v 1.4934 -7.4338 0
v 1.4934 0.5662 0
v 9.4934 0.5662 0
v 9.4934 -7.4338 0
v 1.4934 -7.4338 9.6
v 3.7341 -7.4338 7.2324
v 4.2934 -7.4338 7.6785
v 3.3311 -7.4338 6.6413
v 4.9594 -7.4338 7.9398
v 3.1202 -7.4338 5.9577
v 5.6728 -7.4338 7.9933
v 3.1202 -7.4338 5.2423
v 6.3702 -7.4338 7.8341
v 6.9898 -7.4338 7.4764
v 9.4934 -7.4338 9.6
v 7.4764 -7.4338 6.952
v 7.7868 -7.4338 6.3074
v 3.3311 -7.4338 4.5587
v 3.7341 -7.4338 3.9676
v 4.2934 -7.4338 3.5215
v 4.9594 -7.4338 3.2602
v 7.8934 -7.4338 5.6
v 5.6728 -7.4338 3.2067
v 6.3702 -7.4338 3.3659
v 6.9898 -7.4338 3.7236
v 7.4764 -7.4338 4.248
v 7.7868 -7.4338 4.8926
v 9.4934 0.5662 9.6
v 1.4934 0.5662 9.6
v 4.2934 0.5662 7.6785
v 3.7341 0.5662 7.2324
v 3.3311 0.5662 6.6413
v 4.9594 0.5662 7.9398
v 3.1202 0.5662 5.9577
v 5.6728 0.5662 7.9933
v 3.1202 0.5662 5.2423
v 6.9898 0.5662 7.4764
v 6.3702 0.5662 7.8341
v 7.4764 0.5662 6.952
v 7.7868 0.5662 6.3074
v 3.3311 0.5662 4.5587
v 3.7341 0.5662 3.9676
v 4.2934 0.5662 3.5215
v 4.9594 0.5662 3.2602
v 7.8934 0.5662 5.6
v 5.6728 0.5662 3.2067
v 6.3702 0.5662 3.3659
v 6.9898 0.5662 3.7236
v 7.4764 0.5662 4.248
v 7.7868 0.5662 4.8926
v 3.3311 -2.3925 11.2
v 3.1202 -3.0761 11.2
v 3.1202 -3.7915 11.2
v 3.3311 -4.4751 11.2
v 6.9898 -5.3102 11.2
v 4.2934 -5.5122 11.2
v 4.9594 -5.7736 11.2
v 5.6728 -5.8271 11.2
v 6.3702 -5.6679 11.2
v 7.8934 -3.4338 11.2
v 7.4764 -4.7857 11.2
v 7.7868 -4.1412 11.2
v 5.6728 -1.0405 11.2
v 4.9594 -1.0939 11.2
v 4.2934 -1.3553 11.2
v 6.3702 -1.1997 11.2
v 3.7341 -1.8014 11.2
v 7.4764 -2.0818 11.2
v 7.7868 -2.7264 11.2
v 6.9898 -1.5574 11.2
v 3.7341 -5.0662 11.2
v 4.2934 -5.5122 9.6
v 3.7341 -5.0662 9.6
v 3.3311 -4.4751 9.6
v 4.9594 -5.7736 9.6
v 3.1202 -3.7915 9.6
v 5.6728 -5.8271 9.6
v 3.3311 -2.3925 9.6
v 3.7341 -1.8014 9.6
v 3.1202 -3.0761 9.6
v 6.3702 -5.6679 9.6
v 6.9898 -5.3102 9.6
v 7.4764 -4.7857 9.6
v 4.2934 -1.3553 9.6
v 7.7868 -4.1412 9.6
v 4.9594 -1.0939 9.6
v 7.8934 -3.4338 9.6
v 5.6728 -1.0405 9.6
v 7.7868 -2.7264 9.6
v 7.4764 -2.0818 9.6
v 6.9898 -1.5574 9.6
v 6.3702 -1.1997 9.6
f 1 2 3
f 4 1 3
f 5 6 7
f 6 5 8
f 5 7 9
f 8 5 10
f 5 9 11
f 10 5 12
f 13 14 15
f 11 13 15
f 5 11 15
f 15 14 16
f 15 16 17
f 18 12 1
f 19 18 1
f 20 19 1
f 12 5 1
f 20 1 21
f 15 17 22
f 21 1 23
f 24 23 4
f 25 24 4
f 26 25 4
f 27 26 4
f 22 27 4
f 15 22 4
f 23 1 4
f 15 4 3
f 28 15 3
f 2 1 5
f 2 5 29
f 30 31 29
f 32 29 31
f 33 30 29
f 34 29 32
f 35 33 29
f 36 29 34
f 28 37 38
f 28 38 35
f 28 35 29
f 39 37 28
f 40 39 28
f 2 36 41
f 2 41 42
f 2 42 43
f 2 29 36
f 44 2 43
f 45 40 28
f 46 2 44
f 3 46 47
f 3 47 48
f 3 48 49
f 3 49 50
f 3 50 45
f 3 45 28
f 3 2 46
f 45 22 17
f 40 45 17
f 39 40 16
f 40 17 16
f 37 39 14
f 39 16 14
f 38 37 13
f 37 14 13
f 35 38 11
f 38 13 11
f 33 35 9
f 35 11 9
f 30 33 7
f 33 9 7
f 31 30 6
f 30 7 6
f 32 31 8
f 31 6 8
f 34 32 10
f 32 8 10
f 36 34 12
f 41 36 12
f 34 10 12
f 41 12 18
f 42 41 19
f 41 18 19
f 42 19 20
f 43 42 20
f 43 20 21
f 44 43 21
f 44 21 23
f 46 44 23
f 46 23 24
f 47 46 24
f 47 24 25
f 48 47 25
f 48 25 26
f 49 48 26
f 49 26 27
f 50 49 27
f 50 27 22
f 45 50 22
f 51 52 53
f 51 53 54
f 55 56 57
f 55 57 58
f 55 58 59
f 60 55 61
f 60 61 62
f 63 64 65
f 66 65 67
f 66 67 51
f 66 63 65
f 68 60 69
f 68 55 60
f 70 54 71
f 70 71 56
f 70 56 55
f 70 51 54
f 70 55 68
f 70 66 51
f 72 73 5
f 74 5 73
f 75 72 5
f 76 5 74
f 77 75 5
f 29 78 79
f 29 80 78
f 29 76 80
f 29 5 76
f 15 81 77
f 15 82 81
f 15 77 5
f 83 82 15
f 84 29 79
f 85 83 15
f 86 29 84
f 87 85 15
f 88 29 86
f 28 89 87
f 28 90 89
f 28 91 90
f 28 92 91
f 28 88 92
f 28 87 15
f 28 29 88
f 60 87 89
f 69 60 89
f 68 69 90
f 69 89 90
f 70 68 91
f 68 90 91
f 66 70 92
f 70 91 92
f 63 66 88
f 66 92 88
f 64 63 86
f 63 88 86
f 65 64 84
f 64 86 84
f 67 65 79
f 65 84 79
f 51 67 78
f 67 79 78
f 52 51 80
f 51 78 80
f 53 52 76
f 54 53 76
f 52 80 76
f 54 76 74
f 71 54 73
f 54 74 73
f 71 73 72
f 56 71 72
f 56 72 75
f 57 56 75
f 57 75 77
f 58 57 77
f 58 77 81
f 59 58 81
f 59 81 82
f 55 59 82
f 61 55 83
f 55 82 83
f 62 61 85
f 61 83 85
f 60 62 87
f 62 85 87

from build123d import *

# Parameters (mm, degrees)
F0_W     = 8
F0_H     = 8
F1_DEPTH = 9.6
F2_R     = 2.4
F3_DEPTH = 25
F4_R     = 2.4
F5_DEPTH = 1.6


with BuildPart() as f1:
    # F0 (on Top) → F1 (new body)
    with BuildSketch(Plane.XY):
        with Locations((5.493415, -3.433774)):
            Rectangle(F0_W, F0_H)
    extrude(amount=F1_DEPTH)

    # F2 (on face) → F3 (cut)
    with BuildSketch(Plane.XZ.offset(7.433774)):
        with Locations((5.493415, 5.6)):
            Circle(F2_R)
    extrude(amount=-F3_DEPTH, mode=Mode.SUBTRACT)

    # F4 (on face) → F5 (join)
    with BuildSketch(Plane.XY.offset(9.6)):
        with Locations((5.493415, -3.433774)):
            Circle(F4_R)
    extrude(amount=F5_DEPTH)


solid = f1.part
